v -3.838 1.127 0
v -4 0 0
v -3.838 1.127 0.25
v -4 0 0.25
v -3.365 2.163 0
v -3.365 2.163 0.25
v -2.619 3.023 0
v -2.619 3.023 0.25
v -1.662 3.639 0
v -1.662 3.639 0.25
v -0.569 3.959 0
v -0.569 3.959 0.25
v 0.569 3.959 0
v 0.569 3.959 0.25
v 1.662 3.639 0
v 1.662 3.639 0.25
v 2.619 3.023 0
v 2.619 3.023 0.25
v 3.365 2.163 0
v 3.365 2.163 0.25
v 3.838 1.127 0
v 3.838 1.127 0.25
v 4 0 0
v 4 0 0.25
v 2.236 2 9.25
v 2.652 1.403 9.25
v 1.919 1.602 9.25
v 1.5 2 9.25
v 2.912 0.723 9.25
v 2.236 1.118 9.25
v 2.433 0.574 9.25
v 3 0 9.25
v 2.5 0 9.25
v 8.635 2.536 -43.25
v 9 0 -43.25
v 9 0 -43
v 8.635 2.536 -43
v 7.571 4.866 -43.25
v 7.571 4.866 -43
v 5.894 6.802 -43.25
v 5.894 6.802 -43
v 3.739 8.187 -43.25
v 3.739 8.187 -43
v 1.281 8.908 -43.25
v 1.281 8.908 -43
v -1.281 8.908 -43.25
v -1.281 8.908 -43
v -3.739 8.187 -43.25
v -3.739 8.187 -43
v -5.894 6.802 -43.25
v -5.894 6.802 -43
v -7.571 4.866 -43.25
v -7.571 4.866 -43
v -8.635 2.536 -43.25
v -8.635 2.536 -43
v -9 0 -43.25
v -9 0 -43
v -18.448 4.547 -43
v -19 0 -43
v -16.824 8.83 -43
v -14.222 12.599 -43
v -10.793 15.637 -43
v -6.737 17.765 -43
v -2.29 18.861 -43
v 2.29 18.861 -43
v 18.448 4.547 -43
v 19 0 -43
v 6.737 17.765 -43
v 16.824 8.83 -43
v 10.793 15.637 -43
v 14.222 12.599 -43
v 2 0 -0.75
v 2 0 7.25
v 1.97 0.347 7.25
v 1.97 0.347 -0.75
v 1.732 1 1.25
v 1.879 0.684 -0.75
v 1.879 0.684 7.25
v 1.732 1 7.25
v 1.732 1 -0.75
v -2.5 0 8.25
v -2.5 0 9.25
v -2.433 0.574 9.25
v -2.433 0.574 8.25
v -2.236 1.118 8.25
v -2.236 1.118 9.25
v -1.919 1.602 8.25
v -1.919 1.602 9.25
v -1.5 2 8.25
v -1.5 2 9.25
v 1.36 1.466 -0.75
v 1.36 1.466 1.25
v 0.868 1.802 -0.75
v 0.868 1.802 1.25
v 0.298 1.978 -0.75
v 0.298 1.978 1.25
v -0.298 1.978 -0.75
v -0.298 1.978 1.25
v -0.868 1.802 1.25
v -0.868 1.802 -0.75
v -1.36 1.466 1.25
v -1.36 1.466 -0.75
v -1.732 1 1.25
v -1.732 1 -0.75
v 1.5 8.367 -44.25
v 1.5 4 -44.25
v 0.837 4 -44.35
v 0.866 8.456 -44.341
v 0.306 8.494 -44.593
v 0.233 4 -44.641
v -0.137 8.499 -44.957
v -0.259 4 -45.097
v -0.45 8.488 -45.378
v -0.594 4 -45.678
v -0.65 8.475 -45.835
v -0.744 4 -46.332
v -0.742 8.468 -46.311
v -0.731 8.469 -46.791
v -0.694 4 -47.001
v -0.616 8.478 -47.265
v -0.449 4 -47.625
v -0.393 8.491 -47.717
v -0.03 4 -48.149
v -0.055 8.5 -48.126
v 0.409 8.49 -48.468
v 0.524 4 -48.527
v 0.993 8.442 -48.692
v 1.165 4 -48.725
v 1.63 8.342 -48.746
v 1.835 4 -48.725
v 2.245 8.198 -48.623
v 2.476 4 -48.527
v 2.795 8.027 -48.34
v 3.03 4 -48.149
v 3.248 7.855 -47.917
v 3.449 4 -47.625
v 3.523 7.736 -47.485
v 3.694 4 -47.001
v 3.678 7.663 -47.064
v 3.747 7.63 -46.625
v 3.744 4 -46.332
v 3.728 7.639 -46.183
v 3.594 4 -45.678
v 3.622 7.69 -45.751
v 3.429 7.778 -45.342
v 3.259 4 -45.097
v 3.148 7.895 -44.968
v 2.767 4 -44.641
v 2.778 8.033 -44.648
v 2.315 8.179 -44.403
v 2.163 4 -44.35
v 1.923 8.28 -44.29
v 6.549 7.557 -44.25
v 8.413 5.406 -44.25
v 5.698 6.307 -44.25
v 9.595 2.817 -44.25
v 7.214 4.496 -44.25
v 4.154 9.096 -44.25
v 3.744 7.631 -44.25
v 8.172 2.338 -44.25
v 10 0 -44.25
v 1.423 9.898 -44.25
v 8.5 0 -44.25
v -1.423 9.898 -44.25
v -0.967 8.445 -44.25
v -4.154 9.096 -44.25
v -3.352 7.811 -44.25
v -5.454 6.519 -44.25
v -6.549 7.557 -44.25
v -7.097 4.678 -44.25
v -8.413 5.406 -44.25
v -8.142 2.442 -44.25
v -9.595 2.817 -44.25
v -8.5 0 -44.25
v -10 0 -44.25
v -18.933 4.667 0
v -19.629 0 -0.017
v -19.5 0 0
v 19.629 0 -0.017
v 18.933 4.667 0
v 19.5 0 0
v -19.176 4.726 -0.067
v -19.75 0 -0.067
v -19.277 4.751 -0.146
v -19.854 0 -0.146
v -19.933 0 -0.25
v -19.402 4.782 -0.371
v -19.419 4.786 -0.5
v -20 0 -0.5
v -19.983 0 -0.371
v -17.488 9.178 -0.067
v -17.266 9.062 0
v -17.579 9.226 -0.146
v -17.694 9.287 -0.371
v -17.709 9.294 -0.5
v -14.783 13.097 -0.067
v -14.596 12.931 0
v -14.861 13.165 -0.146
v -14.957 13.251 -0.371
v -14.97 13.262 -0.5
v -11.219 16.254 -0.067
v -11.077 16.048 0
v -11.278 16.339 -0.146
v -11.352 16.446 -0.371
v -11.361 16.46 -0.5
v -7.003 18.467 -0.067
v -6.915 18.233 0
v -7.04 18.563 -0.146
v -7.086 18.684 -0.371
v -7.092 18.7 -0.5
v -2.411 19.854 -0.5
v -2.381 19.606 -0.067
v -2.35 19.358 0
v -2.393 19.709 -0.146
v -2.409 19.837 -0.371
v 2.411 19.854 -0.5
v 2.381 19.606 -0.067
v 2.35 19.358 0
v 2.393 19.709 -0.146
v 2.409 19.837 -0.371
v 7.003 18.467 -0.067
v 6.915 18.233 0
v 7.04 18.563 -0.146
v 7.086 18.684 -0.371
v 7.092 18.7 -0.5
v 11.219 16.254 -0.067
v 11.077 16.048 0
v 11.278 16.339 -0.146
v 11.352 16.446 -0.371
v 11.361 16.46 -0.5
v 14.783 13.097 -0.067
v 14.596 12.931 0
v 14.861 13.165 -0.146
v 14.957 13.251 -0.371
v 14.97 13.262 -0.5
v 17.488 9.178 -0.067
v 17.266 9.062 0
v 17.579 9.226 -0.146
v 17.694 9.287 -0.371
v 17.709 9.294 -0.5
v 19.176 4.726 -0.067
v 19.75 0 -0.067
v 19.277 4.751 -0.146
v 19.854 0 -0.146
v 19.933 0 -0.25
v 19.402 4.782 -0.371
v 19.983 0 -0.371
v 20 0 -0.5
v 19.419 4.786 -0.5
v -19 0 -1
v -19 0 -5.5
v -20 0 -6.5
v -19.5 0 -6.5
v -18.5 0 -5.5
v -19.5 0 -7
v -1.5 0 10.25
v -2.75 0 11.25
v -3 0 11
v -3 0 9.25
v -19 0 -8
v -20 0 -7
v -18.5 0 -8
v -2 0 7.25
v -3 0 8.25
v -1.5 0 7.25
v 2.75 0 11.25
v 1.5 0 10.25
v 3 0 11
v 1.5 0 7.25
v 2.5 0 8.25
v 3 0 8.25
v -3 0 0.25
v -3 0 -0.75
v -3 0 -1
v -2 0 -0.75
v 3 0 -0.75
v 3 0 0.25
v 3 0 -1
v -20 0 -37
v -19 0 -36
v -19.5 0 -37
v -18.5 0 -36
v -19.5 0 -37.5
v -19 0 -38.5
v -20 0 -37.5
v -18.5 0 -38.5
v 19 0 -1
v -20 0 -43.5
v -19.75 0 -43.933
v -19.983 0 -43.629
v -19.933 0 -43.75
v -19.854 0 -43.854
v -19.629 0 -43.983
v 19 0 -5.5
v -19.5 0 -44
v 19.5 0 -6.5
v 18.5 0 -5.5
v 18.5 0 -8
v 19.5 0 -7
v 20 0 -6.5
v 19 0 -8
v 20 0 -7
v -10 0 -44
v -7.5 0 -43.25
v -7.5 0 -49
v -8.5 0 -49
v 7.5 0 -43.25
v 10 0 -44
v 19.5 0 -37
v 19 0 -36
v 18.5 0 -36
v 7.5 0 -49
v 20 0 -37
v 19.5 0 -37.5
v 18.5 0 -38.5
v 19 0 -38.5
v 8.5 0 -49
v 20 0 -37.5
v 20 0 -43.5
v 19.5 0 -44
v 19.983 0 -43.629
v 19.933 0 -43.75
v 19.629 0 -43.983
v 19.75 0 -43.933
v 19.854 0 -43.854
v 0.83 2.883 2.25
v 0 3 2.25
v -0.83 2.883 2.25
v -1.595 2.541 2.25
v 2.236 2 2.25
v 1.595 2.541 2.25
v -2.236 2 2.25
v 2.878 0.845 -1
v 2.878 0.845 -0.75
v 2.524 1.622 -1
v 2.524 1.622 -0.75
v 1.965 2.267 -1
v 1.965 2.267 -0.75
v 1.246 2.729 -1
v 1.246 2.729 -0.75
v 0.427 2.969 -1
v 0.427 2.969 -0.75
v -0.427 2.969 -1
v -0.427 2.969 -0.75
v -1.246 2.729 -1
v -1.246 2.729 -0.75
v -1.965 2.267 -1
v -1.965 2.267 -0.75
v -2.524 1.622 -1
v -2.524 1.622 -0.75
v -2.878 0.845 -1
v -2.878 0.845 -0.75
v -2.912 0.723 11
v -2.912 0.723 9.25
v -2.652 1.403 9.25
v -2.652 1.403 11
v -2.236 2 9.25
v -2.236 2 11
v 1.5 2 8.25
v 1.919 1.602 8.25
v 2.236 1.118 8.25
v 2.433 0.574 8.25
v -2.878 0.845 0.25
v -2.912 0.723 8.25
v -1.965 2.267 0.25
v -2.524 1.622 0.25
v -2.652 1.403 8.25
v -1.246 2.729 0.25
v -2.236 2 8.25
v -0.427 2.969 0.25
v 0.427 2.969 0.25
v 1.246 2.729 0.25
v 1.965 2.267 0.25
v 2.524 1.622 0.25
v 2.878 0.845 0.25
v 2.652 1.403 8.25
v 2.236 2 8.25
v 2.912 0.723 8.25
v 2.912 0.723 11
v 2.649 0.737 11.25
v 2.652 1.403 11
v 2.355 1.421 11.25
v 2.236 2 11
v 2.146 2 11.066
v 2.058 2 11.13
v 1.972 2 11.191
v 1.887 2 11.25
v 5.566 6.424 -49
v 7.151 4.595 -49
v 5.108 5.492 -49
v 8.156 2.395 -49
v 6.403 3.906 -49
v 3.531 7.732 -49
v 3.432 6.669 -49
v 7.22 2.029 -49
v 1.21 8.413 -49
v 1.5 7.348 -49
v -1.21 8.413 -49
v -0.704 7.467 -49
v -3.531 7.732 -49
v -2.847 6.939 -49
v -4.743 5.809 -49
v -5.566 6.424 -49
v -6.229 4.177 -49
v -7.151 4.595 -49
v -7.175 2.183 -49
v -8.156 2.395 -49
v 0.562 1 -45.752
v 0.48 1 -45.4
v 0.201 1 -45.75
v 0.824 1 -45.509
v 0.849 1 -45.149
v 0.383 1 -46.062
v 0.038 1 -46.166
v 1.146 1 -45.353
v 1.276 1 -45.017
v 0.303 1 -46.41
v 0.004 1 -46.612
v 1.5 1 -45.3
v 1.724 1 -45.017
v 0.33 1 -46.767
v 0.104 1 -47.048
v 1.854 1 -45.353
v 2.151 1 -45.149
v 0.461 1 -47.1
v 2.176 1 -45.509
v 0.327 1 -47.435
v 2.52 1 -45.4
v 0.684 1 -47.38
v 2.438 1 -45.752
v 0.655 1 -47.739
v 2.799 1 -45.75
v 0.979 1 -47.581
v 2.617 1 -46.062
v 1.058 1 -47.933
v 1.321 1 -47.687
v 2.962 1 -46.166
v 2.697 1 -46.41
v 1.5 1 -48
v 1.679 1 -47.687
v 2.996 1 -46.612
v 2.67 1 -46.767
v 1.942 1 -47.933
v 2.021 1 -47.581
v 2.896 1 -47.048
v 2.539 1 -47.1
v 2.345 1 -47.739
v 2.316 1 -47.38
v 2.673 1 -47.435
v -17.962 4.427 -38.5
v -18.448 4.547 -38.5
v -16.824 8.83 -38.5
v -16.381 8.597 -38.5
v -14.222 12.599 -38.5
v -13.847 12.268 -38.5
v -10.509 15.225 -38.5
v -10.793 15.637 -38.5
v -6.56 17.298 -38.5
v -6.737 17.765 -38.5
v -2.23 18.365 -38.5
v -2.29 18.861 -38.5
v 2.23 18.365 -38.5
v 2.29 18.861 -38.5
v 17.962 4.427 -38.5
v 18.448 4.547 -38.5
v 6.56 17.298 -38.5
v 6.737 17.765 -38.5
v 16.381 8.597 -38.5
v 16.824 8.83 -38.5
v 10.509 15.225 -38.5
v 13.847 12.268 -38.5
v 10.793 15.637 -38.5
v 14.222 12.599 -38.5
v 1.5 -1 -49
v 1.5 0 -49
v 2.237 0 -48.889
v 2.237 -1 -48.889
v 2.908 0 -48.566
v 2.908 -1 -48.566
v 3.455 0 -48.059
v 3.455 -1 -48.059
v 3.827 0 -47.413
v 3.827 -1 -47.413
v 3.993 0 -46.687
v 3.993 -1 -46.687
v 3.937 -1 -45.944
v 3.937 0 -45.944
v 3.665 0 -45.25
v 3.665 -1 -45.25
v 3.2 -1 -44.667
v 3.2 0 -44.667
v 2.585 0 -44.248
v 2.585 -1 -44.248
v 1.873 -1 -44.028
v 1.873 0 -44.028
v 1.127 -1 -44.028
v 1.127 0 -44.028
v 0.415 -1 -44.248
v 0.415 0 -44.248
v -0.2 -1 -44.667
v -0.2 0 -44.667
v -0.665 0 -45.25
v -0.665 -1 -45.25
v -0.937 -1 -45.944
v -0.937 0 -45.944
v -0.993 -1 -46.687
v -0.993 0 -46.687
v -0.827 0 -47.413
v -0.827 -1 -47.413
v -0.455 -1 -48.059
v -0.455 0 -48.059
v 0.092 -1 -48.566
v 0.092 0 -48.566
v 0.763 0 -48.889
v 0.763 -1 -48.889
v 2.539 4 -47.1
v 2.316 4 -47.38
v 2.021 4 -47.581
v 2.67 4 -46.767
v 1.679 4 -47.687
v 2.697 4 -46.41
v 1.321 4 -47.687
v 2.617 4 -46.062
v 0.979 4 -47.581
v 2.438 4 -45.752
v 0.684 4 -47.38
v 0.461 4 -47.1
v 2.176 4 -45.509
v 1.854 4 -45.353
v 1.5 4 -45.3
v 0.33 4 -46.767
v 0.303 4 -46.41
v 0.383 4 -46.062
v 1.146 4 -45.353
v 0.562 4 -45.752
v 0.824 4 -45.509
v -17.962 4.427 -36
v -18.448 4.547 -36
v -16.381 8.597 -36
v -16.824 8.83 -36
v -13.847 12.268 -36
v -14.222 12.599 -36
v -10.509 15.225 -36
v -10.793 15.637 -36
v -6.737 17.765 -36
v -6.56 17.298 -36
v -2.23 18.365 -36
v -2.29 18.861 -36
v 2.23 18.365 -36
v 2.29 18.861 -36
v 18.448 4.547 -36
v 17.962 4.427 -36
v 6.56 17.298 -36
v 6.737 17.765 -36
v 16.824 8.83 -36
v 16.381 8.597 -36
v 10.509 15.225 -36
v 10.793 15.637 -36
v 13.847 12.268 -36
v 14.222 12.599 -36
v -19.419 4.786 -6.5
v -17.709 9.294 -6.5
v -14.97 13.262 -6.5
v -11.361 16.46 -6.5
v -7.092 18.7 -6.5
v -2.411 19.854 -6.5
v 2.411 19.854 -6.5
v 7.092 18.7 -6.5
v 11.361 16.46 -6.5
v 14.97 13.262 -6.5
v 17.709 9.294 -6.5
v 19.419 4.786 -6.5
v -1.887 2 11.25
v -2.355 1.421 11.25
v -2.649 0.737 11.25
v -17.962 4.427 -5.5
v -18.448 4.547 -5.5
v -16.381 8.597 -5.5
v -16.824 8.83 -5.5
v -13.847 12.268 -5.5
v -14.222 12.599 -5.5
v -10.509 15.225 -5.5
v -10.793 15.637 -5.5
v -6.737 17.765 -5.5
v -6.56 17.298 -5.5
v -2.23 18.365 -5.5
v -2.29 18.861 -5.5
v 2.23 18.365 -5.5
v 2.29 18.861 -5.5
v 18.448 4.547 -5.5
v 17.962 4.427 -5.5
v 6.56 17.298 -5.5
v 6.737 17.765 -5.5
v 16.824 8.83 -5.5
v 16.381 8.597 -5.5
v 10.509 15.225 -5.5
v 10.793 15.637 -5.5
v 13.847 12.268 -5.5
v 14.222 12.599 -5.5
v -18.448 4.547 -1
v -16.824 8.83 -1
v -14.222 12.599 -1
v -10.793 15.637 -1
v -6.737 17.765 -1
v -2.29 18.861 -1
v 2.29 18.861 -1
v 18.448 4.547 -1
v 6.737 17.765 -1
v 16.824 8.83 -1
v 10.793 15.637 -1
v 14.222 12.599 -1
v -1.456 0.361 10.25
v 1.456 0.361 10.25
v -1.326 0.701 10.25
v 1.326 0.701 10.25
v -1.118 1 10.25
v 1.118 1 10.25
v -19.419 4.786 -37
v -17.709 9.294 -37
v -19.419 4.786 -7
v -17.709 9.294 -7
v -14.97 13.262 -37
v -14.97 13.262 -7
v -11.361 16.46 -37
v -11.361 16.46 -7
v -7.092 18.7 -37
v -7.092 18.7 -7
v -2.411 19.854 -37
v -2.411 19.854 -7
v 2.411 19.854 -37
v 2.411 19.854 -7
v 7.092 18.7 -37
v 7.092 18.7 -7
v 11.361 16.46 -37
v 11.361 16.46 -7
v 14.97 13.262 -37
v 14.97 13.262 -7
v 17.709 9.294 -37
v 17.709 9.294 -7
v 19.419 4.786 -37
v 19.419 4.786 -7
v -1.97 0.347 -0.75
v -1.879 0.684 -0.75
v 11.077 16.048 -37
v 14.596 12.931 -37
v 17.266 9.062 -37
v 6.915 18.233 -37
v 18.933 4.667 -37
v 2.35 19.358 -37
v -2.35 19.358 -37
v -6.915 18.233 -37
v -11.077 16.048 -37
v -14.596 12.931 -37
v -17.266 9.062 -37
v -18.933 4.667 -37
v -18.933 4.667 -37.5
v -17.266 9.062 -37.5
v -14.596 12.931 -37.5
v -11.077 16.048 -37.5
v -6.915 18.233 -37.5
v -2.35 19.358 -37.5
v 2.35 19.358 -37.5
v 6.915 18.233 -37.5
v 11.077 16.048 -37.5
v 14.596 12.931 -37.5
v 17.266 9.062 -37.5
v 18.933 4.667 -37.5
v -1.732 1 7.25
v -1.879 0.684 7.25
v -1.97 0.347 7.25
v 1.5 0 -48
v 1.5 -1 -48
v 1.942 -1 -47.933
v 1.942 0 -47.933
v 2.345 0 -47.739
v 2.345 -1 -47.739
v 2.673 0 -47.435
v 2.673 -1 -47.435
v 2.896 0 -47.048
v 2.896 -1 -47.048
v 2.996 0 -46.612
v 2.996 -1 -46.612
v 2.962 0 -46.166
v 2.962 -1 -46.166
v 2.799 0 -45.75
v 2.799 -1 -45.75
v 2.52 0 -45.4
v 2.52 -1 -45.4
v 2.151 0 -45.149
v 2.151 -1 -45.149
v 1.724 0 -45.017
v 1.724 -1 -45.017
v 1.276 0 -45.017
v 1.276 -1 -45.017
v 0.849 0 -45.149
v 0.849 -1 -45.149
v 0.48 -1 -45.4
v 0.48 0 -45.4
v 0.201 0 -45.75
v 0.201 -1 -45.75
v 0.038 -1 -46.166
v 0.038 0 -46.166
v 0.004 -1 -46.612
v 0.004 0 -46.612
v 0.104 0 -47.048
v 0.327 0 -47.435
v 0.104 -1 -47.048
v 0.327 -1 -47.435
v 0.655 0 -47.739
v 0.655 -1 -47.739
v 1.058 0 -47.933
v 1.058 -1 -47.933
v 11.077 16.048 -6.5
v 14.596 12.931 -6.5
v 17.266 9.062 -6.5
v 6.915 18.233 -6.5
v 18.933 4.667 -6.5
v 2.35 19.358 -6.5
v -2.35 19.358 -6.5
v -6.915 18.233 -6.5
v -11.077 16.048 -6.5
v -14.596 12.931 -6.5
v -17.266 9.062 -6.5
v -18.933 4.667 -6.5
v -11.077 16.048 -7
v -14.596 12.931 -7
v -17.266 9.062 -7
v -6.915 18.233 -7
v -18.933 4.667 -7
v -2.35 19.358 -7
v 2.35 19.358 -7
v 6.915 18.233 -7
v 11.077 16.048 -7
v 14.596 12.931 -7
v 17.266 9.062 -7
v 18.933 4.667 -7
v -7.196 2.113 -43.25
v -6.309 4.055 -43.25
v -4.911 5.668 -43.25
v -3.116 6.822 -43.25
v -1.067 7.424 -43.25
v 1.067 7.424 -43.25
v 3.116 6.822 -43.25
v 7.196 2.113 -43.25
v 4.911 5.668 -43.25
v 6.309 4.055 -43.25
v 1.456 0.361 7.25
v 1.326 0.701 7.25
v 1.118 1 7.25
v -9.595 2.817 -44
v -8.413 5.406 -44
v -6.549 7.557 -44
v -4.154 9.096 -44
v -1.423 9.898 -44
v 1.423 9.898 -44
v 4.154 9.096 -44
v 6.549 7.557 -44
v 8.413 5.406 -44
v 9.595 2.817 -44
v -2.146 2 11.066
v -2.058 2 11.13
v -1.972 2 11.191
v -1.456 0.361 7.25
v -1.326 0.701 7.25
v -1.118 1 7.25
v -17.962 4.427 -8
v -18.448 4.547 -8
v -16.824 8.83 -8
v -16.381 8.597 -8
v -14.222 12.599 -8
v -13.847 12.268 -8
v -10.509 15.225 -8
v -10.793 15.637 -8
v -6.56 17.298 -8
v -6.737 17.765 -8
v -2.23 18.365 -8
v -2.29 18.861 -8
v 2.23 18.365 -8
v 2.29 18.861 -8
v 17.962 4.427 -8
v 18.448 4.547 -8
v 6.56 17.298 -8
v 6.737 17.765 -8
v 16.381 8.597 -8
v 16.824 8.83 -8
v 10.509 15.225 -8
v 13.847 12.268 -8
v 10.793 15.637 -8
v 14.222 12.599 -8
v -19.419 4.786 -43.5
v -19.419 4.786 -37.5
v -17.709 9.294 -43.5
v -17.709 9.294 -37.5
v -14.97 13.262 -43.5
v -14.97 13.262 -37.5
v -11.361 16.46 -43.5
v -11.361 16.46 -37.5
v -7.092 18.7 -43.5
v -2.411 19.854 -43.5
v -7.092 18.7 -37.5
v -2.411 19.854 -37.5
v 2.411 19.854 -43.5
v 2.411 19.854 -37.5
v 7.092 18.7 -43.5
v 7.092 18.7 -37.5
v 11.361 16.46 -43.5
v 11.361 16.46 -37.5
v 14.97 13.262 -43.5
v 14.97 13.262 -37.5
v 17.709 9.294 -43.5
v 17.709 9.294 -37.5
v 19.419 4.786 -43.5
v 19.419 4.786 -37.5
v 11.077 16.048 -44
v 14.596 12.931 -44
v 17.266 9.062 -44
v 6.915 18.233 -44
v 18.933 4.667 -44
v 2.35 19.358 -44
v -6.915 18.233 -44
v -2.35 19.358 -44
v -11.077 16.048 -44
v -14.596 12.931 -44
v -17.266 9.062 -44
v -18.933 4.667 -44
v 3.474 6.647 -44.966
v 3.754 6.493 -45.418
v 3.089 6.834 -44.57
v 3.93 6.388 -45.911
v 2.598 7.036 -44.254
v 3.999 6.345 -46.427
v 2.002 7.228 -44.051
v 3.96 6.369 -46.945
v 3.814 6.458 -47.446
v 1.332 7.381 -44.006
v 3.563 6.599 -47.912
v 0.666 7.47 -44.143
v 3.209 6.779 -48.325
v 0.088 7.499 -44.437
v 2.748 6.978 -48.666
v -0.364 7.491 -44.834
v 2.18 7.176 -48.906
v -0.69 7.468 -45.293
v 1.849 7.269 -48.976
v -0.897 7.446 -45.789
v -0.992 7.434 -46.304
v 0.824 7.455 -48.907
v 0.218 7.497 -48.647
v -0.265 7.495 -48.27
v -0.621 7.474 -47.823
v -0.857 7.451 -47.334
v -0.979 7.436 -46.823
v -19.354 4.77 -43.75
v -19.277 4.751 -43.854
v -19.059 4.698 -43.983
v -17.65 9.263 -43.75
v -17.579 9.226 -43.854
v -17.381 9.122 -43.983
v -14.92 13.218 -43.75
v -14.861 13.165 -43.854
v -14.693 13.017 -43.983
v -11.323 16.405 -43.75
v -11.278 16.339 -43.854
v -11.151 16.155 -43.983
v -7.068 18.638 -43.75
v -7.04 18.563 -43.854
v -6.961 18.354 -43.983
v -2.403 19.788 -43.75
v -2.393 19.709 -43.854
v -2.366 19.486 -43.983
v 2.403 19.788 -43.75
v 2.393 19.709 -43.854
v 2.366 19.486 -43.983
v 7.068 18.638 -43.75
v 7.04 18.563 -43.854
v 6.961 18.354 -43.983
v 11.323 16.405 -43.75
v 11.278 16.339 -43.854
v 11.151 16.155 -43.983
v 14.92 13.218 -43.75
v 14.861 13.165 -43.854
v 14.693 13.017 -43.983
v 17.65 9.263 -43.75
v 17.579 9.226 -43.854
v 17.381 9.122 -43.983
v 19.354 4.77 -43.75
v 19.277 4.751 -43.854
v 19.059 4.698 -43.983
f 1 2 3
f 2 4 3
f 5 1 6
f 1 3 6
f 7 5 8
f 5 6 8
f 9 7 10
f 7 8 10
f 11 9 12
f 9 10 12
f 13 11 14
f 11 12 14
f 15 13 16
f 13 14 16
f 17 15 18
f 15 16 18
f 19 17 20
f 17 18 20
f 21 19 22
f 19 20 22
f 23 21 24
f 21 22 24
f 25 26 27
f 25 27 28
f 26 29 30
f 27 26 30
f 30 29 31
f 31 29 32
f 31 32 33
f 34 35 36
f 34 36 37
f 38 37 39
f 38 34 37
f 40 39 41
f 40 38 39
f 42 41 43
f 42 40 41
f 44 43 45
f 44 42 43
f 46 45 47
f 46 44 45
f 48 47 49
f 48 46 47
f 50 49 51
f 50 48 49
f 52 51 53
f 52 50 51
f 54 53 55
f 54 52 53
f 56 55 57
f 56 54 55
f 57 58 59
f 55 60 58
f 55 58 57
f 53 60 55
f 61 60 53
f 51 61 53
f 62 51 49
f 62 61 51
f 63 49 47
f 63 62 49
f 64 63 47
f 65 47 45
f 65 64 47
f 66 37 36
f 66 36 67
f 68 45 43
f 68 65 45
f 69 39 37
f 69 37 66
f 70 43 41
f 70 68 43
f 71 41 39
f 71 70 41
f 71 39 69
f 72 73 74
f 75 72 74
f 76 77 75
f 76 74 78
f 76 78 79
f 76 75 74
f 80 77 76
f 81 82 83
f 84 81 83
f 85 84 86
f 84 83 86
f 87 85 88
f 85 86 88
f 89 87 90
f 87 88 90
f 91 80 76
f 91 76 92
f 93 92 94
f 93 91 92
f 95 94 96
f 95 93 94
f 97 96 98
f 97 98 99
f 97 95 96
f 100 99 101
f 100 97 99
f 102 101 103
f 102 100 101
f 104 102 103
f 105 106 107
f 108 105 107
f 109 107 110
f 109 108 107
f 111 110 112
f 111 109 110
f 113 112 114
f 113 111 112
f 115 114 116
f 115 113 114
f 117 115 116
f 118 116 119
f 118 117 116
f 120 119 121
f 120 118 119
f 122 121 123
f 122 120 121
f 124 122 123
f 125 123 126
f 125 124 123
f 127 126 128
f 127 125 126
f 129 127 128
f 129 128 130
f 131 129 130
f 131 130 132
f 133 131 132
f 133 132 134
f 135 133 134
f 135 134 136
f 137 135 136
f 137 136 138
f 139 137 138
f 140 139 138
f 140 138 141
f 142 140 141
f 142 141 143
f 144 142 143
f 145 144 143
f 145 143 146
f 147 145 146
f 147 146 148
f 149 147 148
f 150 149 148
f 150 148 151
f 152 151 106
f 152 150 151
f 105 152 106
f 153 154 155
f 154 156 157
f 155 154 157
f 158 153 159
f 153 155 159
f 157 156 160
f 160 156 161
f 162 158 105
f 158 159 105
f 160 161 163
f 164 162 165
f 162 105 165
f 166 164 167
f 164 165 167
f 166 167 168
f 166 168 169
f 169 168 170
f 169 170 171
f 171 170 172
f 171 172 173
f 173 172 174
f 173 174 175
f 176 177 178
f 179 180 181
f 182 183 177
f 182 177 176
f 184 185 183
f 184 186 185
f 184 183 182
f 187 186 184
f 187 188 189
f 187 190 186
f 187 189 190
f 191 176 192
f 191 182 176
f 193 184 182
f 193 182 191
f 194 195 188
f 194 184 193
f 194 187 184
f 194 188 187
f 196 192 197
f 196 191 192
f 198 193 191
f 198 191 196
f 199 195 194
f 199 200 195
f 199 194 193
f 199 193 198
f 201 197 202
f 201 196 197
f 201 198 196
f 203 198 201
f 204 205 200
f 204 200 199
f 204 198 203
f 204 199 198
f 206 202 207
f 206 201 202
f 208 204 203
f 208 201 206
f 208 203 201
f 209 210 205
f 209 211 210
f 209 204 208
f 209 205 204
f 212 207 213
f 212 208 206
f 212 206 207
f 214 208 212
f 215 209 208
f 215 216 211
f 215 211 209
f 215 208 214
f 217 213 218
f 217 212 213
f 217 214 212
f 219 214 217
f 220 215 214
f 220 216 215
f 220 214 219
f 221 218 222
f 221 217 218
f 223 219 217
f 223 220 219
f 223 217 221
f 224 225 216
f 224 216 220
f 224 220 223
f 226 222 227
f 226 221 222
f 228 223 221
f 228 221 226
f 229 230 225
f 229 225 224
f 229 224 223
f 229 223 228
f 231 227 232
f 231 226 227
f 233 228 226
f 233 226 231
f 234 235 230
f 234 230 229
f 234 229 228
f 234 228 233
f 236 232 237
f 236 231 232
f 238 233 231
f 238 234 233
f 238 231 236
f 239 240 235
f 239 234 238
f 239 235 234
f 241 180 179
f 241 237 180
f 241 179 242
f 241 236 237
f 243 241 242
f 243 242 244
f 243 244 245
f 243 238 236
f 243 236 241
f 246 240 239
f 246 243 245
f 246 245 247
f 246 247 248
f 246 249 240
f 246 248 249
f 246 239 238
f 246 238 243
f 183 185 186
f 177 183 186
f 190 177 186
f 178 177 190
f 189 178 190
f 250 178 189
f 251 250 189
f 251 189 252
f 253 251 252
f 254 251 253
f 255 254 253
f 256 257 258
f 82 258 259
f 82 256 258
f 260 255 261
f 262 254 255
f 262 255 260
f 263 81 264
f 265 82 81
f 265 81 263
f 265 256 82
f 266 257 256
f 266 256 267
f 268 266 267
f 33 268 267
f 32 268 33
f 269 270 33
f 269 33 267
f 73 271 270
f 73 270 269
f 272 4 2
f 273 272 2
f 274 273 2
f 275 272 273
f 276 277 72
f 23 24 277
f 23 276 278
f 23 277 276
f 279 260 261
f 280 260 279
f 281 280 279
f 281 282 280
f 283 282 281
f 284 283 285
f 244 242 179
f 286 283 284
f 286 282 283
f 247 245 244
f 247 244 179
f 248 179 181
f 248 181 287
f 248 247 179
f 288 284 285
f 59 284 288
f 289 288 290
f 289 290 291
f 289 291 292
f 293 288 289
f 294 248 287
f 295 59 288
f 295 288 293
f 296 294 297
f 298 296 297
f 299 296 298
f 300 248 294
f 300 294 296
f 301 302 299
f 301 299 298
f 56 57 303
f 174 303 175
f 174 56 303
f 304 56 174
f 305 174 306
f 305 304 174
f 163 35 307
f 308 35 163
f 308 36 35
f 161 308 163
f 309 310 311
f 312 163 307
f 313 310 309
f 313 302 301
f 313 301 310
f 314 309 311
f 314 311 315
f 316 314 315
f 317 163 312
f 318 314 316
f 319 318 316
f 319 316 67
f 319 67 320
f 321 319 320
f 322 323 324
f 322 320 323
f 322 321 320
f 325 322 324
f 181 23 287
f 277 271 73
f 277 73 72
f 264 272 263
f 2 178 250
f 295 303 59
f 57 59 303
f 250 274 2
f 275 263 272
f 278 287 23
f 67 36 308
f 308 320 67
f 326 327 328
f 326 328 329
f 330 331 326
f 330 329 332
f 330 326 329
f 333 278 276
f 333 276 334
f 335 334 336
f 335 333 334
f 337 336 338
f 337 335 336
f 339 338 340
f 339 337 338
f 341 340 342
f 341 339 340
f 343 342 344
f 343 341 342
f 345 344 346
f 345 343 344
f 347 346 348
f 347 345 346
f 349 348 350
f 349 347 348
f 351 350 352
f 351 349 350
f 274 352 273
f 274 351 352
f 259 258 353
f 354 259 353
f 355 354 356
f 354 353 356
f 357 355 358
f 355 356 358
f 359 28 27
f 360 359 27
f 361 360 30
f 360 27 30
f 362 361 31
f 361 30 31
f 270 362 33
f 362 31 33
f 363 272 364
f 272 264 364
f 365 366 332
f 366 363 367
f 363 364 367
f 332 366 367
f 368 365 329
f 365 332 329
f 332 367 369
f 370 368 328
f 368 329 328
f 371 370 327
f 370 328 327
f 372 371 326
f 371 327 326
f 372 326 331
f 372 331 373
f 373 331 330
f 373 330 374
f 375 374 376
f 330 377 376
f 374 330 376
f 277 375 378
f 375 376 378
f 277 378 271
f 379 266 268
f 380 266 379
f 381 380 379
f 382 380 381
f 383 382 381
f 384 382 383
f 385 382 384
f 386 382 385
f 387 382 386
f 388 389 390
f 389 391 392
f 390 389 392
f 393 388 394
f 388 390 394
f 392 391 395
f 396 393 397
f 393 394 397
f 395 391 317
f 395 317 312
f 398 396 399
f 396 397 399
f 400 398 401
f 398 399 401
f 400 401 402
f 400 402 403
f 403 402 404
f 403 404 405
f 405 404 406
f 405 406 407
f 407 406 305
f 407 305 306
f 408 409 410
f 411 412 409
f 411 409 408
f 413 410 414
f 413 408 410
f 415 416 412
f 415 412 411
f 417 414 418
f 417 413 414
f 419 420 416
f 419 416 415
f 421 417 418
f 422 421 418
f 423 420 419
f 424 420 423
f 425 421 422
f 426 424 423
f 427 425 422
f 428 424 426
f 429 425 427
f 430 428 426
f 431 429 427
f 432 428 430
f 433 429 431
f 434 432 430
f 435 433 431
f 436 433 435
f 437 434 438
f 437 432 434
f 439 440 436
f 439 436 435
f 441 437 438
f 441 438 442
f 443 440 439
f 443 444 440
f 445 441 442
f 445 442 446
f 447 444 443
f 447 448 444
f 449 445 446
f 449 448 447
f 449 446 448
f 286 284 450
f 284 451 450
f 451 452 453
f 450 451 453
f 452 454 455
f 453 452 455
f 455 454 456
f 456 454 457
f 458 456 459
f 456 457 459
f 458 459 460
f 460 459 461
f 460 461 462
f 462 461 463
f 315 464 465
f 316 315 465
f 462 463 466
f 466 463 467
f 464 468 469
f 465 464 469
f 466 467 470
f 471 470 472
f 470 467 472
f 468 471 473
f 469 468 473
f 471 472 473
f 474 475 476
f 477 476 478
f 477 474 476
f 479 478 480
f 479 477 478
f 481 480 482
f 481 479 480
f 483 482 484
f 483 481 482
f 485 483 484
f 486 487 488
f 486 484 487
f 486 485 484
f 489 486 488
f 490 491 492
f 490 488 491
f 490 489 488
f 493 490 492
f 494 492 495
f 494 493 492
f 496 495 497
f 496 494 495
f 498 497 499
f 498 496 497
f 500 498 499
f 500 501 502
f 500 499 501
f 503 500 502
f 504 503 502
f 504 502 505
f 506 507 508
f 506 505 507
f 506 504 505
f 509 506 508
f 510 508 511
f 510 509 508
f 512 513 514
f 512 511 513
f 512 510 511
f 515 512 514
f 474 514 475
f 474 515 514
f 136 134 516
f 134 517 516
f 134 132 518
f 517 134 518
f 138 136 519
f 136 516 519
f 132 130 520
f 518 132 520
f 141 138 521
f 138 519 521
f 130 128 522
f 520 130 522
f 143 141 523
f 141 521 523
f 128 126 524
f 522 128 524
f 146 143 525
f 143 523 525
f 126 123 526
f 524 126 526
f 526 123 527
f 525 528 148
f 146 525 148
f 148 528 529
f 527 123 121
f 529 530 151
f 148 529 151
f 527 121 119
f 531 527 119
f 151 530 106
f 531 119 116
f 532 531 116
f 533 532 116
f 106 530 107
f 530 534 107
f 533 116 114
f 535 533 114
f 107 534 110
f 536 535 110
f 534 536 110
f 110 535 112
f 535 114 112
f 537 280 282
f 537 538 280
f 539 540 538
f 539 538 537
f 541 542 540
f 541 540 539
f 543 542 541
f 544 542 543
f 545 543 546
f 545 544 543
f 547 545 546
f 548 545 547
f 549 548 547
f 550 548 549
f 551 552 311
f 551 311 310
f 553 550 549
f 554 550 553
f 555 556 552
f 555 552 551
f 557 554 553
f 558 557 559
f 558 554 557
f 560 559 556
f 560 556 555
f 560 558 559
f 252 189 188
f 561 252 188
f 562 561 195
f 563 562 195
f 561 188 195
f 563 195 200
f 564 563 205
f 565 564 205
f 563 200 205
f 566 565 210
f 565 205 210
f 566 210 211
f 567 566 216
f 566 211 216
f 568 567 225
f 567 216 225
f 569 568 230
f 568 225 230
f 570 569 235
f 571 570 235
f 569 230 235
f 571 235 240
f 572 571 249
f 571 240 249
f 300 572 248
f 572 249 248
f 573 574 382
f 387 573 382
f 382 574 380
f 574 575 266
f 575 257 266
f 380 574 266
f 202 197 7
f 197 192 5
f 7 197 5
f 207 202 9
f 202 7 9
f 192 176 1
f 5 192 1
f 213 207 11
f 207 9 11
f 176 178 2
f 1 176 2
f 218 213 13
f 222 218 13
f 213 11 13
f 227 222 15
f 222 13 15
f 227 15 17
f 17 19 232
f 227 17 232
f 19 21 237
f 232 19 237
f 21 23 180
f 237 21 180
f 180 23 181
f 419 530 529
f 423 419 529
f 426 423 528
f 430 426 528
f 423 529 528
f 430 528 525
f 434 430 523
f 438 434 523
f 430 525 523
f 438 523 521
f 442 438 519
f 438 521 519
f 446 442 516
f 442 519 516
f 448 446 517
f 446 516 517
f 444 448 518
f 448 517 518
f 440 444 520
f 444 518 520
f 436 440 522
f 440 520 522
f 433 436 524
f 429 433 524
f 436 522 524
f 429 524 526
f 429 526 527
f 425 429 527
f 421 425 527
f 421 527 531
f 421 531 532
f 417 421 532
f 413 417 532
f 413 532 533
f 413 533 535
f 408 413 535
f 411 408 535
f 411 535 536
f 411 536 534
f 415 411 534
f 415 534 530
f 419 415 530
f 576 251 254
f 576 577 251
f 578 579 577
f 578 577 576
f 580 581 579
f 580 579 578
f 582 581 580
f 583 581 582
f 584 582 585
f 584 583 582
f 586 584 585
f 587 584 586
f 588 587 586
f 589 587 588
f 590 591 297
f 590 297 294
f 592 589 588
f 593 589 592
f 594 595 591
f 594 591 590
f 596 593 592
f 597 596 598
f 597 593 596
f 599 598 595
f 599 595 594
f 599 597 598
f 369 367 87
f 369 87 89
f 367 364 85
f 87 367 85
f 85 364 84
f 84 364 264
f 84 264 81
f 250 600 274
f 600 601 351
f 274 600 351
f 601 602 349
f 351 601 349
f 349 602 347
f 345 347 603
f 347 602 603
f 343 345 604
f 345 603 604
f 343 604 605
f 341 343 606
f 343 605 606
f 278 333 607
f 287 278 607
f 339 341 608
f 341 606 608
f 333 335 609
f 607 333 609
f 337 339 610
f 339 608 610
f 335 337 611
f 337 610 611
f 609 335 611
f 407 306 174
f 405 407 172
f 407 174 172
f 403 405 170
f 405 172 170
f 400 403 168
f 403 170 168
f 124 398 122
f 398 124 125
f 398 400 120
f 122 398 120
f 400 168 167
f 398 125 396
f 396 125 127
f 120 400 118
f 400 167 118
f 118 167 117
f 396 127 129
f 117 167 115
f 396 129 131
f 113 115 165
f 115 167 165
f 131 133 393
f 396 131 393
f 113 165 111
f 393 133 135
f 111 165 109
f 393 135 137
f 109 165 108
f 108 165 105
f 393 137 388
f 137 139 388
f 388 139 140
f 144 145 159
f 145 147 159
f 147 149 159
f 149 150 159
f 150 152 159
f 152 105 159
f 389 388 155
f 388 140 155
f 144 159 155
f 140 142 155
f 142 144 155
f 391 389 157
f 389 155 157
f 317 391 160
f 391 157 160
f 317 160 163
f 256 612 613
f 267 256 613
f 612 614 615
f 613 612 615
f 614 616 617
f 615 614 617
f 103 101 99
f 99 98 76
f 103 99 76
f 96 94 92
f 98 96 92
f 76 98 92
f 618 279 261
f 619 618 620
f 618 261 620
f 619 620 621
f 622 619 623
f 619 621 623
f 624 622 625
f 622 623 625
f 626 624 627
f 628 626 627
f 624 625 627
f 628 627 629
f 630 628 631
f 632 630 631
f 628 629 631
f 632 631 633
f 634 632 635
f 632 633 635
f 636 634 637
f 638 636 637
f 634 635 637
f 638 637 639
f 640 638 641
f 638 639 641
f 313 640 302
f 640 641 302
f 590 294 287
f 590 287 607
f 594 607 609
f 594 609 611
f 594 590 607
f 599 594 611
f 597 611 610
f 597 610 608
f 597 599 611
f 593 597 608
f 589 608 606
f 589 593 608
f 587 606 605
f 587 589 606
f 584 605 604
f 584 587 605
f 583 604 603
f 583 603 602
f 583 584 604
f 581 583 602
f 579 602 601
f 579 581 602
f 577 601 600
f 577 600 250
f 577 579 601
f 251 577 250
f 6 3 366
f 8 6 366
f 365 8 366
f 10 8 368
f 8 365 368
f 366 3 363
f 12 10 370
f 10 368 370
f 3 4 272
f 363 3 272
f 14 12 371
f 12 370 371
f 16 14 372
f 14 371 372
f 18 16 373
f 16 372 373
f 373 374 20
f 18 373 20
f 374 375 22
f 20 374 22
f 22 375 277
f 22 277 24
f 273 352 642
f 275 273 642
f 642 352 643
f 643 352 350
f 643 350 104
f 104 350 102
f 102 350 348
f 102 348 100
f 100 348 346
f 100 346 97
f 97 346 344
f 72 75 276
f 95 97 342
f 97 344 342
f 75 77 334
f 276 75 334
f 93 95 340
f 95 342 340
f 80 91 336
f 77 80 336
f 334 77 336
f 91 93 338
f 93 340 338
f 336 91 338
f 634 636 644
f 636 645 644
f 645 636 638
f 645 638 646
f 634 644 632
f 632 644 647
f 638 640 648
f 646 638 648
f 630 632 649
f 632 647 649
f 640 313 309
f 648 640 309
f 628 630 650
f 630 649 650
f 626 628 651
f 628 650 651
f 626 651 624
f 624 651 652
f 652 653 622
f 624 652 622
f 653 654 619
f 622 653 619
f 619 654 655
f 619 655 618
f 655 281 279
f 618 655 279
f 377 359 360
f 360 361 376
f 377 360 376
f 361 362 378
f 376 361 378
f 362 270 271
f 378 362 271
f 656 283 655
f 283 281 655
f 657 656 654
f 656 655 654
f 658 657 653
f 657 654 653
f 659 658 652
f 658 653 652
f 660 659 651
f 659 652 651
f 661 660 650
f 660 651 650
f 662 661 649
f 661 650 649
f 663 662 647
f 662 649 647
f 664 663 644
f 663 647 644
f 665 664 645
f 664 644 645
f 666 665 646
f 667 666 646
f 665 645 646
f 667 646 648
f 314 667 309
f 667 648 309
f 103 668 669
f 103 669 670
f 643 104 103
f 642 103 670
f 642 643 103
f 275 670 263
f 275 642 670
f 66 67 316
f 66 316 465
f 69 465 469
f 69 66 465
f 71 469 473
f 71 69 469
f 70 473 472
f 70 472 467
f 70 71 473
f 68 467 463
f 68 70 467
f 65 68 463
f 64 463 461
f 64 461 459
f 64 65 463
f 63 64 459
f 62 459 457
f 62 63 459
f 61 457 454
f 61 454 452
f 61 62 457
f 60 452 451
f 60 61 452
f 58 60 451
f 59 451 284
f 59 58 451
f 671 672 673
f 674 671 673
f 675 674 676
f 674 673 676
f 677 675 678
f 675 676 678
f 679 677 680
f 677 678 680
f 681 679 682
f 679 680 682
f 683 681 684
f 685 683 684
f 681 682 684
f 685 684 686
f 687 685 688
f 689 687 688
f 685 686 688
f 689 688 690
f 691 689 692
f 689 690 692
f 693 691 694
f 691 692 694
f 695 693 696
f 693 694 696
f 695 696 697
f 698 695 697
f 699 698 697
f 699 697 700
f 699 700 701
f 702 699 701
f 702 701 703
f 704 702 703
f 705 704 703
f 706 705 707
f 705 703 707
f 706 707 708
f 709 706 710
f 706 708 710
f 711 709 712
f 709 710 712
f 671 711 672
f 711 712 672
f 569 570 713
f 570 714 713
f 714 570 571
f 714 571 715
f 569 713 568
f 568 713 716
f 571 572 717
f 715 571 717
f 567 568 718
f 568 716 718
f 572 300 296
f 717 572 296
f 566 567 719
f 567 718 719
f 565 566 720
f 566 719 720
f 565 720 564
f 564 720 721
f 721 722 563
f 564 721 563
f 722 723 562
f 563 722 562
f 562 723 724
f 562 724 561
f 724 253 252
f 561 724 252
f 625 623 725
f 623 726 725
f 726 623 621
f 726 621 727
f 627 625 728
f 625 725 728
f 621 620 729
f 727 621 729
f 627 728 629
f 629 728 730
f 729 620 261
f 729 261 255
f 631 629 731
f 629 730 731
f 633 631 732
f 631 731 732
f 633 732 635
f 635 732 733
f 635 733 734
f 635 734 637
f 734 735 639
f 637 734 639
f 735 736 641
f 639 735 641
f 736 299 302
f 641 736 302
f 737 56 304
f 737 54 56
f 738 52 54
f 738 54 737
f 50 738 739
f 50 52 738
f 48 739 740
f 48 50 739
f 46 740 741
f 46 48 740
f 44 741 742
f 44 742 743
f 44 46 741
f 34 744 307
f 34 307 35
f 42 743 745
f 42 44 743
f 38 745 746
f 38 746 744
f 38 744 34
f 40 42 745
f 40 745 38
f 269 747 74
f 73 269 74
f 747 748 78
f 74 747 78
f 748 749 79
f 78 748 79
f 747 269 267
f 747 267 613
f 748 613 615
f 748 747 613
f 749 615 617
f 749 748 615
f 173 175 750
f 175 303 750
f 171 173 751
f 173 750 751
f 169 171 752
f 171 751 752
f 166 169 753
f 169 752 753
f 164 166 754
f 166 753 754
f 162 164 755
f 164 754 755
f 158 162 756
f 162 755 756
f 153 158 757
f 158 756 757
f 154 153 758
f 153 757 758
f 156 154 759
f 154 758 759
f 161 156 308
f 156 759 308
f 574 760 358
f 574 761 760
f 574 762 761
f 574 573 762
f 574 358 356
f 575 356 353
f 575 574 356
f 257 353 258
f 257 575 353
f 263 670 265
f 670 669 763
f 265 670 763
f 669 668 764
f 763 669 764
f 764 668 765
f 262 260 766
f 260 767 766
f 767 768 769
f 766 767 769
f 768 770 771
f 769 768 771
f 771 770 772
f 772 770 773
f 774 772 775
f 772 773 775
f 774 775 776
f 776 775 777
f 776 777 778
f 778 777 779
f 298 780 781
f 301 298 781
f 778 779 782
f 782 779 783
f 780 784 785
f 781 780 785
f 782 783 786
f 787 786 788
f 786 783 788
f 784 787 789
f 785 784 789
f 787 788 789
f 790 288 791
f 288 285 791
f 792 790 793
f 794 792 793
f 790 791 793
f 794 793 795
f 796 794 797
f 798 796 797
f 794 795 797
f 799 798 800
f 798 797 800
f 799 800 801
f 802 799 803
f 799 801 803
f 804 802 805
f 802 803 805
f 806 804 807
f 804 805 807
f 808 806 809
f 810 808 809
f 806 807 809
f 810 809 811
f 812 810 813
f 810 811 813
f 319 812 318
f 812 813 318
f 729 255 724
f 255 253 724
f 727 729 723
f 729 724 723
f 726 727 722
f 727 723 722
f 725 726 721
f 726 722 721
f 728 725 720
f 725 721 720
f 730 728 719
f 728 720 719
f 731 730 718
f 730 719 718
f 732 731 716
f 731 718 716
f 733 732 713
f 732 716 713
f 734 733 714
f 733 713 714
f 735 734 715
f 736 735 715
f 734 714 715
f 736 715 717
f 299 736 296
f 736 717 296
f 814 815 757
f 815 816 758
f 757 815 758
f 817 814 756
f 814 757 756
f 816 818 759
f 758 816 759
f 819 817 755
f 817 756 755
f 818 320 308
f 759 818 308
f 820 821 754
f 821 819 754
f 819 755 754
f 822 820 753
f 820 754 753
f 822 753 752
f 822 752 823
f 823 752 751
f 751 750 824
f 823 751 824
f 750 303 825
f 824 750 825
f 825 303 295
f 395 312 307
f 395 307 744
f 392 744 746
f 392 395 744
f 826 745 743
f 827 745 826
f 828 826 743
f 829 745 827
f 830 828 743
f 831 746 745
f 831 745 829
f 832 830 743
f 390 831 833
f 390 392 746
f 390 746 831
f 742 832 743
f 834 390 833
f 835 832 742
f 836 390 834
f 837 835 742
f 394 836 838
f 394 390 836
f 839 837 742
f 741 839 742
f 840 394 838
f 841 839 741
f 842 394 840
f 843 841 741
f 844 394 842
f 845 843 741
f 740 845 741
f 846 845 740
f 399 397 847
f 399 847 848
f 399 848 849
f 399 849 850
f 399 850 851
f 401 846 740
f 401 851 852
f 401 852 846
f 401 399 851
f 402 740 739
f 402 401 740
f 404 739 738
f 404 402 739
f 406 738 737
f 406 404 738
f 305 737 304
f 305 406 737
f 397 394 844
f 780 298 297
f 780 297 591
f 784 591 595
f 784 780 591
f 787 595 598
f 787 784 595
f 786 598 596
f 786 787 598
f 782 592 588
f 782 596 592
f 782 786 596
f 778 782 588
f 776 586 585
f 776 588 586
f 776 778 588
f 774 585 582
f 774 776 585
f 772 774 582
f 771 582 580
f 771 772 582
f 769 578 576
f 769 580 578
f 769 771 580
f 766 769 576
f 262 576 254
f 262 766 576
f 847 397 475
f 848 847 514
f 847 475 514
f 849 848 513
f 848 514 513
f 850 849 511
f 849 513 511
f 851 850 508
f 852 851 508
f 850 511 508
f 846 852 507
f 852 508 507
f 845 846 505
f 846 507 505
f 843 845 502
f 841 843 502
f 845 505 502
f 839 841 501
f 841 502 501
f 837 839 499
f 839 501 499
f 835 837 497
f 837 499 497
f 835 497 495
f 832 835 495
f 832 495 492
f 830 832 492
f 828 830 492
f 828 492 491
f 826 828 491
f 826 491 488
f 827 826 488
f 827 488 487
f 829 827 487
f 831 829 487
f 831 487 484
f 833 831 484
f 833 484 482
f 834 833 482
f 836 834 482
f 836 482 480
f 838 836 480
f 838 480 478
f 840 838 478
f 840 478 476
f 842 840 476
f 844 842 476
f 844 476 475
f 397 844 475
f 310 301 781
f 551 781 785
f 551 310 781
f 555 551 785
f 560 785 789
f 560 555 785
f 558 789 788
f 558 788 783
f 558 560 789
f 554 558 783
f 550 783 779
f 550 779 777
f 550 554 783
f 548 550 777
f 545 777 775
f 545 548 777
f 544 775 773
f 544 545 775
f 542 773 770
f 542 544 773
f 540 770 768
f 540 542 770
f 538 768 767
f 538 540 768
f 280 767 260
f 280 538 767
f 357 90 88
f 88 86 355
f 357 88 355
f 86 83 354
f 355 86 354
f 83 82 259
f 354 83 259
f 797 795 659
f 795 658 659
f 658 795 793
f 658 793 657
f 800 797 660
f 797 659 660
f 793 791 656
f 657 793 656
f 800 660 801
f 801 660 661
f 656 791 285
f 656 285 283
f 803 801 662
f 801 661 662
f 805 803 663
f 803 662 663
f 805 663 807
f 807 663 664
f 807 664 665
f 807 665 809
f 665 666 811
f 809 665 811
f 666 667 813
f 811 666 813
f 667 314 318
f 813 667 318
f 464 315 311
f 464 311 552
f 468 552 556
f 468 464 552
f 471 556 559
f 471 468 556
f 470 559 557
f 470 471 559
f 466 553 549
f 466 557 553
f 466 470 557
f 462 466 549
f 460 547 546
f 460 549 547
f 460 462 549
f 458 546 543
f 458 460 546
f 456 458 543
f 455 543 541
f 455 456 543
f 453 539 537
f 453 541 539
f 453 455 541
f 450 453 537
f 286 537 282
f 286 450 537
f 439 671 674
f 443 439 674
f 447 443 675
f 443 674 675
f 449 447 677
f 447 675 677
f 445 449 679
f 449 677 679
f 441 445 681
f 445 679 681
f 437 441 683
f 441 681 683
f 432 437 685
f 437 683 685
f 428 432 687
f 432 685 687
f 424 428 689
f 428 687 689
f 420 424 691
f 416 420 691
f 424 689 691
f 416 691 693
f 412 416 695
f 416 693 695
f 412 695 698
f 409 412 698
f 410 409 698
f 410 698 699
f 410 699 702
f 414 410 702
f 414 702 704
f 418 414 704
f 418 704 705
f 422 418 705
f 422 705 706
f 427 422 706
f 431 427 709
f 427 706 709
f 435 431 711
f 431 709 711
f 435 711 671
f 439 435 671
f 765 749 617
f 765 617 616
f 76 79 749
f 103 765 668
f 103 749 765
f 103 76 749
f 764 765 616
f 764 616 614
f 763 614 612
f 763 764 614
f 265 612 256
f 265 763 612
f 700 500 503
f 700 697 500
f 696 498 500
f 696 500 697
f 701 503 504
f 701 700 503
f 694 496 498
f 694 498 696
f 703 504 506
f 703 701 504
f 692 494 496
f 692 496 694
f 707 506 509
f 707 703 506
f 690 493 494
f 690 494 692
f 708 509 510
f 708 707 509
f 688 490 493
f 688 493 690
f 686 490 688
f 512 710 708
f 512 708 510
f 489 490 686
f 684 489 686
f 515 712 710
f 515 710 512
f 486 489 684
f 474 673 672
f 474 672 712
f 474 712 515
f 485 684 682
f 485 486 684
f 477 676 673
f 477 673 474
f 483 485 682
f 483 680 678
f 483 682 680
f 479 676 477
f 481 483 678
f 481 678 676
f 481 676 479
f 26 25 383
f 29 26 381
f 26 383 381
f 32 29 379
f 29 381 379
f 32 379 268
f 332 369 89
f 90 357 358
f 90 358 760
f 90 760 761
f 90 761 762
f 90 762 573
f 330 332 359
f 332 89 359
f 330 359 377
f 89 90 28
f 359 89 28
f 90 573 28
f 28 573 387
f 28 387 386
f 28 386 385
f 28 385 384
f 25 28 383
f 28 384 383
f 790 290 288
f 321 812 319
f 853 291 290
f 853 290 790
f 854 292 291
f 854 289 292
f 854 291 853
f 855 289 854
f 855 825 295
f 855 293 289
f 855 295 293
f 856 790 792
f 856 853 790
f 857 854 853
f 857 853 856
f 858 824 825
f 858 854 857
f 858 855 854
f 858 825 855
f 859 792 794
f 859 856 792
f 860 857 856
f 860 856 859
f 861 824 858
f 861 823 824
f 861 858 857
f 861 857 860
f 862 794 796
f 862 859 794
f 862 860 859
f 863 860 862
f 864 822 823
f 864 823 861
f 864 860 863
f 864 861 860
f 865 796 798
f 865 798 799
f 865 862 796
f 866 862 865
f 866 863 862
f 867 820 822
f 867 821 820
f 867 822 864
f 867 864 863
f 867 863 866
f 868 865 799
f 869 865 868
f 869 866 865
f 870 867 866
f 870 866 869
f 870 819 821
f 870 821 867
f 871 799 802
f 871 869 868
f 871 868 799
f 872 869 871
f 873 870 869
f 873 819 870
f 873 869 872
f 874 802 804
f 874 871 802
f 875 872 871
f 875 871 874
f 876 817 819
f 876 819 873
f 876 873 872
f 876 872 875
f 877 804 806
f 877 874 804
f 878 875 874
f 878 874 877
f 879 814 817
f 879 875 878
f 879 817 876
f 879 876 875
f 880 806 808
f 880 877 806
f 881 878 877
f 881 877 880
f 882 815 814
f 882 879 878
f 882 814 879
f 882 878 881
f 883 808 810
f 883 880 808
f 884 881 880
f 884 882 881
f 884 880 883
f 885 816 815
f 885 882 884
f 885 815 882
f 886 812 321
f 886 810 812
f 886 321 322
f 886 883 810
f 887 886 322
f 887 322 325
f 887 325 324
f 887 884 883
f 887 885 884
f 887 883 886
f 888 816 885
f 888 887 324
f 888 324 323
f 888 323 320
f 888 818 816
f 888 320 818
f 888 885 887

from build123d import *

# Parameters (mm, degrees)
ENL_V_MAT_EXTRU_2_DEPTH = 9
CHANFREIN1_SIZE         = 0.25
CONG_1_R                = 0.5
ESQUISSE4_R             = 10
ENL_V_MAT_EXTRU_3_DEPTH = 23
CONG_2_R                = 1
ESQUISSE5_W             = 75.40554743
ESQUISSE5_H             = 27.453522384
ENL_V_MAT_EXTRU_4_DEPTH = 30
COQUE1_START            = -43
COQUE1_DEPTH            = 42
COQUE1_START_2          = -36
COQUE1_2_DEPTH          = 28
COQUE1_START_3          = -48
COQUE1_3_DEPTH          = 5
COQUE1_4_DEPTH          = 4.5
COQUE1_START_4          = -5.5
COQUE1_5_DEPTH          = 4.5
COQUE1_START_5          = -1
COQUE1_6_DEPTH          = 8.25
COQUE1_START_6          = -43.25
COQUE1_7_DEPTH          = 0.25
COQUE1_START_7          = 7.25
COQUE1_8_DEPTH          = 3
COQUE1_9_DEPTH          = 2.25
COQUE1_10_DEPTH         = 0.25
ENL_V_START             = -10
ENL_V_MAT_EXTRU_5_DEPTH = 10
BOSS_EXTRU_1_REACH      = 58.577
BOSS_EXTRU_1_END_RADIUS = 7.5
ESQUISSE7_R             = 2.5
ESQUISSE9_R             = 2.25
ENL_V_MAT_EXTRU_6_DEPTH = 7
D_GAGEMENT_M22_D        = 2.4
BOSS_EXTRU_2_START      = 1
ESQUISSE11_R            = 2.5
ESQUISSE11_R_2          = 1.5
BOSS_EXTRU_2_DEPTH      = 1
ESQUISSE12_R            = 1.5
ESQUISSE12_R_2          = 1.2
ENL_V_MAT_EXTRU_7_DEPTH = 1


# Read off the part's stored shape, not the designer's step: Coque1
with BuildPart() as part:
    # Esquisse1 → Révolution1 (revolve)
    with BuildSketch(Plane(origin=(0, 0, 0), x_dir=(1, 0, 0), z_dir=(0, 1, 0))):
        Polygon((20, 0), (4, 0), (4, -0.25), (3, -0.25), (3, -8.25), (2.5, -8.25), (2.5, -9.25), (3, -9.25), (3, -11.25), (0, -11.25), (0, 49), (8.5, 49), (8.5, 44.25), (10, 44.25), (10, 44), (20, 44), (20, 37.5), (19.5, 37.5), (19.5, 37), (20, 37), (20, 7), (19.5, 7), (19.5, 6.5), (20, 6.5), align=None)
    revolve(axis=Axis((0, 0, 0), (0, 0, -1)))

    # Esquisse3 → Enlèv. mat.-Extru.2 (cut)
    with BuildSketch(Plane.XY.offset(11.25)):
        with BuildLine():
            Line((-2.236067977, 2), (2.236067977, 2))
            ThreePointArc((2.236067977, 2), (0, 3), (-2.236067977, 2))
        make_face()
    extrude(amount=-ENL_V_MAT_EXTRU_2_DEPTH, mode=Mode.SUBTRACT)

    # Chanfrein1
    chanfrein1_edges = [part.edges().sort_by_distance(p)[0] for p in [
        (0, -3, 11.25),
    ]]
    chamfer(chanfrein1_edges, length=CHANFREIN1_SIZE)

    # Congé1
    cong_1_edges = [part.edges().sort_by_distance(p)[0] for p in [
        (-20, 0, 0),
        (-20, 0, -44),
    ]]
    fillet(cong_1_edges, radius=CONG_1_R)

    # Esquisse4 → Enlèv. mat.-Extru.3 (cut)
    with BuildSketch(Plane(origin=(0, -29, 0), x_dir=(-1, 0, 0), z_dir=(0, 1, 0))):
        with Locations(Location((0, -22, 0), (0, 0, 270))):
            Circle(ESQUISSE4_R)
    extrude(amount=ENL_V_MAT_EXTRU_3_DEPTH, mode=Mode.SUBTRACT)

    # Congé2
    cong_2_edges = [part.edges().sort_by_distance(p)[0] for p in [
        (-0.062948247, -19.999900935, -12.000198118),
    ]]
    fillet(cong_2_edges, radius=CONG_2_R - 0.0001)  # a hair under: the kernel refuses the full size

    # Esquisse5 → Enlèv. mat.-Extru.4 (cut, symmetric)
    with BuildSketch(Plane(origin=(0, 0, 0), x_dir=(0, 0, -1), z_dir=(1, 0, 0))):
        with Locations((20.552947191, -13.726761192)):
            Rectangle(ESQUISSE5_W, ESQUISSE5_H)
    extrude(amount=ENL_V_MAT_EXTRU_4_DEPTH, both=True, mode=Mode.SUBTRACT)

    # Coque1 outline → Coque1 (cut)
    with BuildSketch(Plane.XY.offset(COQUE1_START)):
        with BuildLine():
            ThreePointArc((18.5, 0), (0, 18.5), (-18.5, 0))
            Line((-18.5, 0), (18.5, 0))
        make_face()
    extrude(amount=COQUE1_DEPTH, mode=Mode.SUBTRACT)

    # Coque1 2 outline → Coque1 2 (cut)
    with BuildSketch(Plane.XY.offset(COQUE1_START_2)):
        with BuildLine():
            Line((-19, 0), (-18.5, 0))
            ThreePointArc((-18.5, 0), (0, 18.5), (18.5, 0))
            Line((18.5, 0), (19, 0))
            ThreePointArc((19, 0), (0, 19), (-19, 0))
        make_face()
    extrude(amount=COQUE1_2_DEPTH, mode=Mode.SUBTRACT)

    # Coque1 3 outline → Coque1 3 (cut)
    with BuildSketch(Plane.XY.offset(COQUE1_START_3)):
        with BuildLine():
            ThreePointArc((7.5, 0), (0, 7.5), (-7.5, 0))
            Line((-7.5, 0), (7.5, 0))
        make_face()
    extrude(amount=COQUE1_3_DEPTH, mode=Mode.SUBTRACT)

    # Coque1 4 outline → Coque1 4 (cut)
    with BuildSketch(Plane.XY.offset(COQUE1_START)):
        with BuildLine():
            Line((-19, 0), (-18.5, 0))
            ThreePointArc((-18.5, 0), (0, 18.5), (18.5, 0))
            Line((18.5, 0), (19, 0))
            ThreePointArc((19, 0), (0, 19), (-19, 0))
        make_face()
    extrude(amount=COQUE1_4_DEPTH, mode=Mode.SUBTRACT)

    # Coque1 5 outline → Coque1 5 (cut)
    with BuildSketch(Plane.XY.offset(COQUE1_START_4)):
        with BuildLine():
            Line((-19, 0), (-18.5, 0))
            ThreePointArc((-18.5, 0), (0, 18.5), (18.5, 0))
            Line((18.5, 0), (19, 0))
            ThreePointArc((19, 0), (0, 19), (-19, 0))
        make_face()
    extrude(amount=COQUE1_5_DEPTH, mode=Mode.SUBTRACT)

    # Coque1 6 outline → Coque1 6 (cut)
    with BuildSketch(Plane.XY.offset(COQUE1_START_5)):
        with BuildLine():
            ThreePointArc((-1.732050808, 1), (-1.931851653, 0.51763809), (-2, 0))
            Line((-2, 0), (2, 0))
            ThreePointArc((2, 0), (1.931851653, 0.51763809), (1.732050808, 1))
            Line((1.732050808, 1), (-1.732050808, 1))
        make_face()
    extrude(amount=COQUE1_6_DEPTH, mode=Mode.SUBTRACT)

    # Coque1 7 outline → Coque1 7 (cut)
    with BuildSketch(Plane.XY.offset(COQUE1_START_6)):
        with BuildLine():
            Line((-9, 0), (-7.5, 0))
            ThreePointArc((-7.5, 0), (0, 7.5), (7.5, 0))
            Line((7.5, 0), (9, 0))
            ThreePointArc((9, 0), (0, 9), (-9, 0))
        make_face()
    extrude(amount=COQUE1_7_DEPTH, mode=Mode.SUBTRACT)

    # Coque1 8 outline → Coque1 8 (cut)
    with BuildSketch(Plane.XY.offset(COQUE1_START_7)):
        with BuildLine():
            Line((1.118033989, 1), (-1.118033989, 1))
            ThreePointArc((-1.118033989, 1), (-1.401258538, 0.535233134), (-1.5, 0))
            Line((-1.5, 0), (1.5, 0))
            ThreePointArc((1.5, 0), (1.401258538, 0.535233134), (1.118033989, 1))
        make_face()
    extrude(amount=COQUE1_8_DEPTH, mode=Mode.SUBTRACT)

    # Coque1 9 outline → Coque1 9 (cut)
    with BuildSketch(Plane.XY.offset(COQUE1_START_5)):
        with BuildLine():
            Line((-1.732050808, 1), (1.732050808, 1))
            ThreePointArc((1.732050808, 1), (0, 2), (-1.732050808, 1))
        make_face()
    extrude(amount=COQUE1_9_DEPTH, mode=Mode.SUBTRACT)

    # Coque1 10 outline → Coque1 10 (cut)
    with BuildSketch(Plane.XY.offset(COQUE1_START_5)):
        with BuildLine():
            ThreePointArc((-2, 0), (0, 2), (2, 0))
            Line((2, 0), (3, 0))
            ThreePointArc((3, 0), (0, 3), (-3, 0))
            Line((-3, 0), (-2, 0))
        make_face()
    extrude(amount=COQUE1_10_DEPTH, mode=Mode.SUBTRACT)

    # Esquisse6 → Enlèv. mat.-Extru.5 (cut)
    with BuildSketch(Plane.XY.offset(-48).offset(ENL_V_START)):
        with BuildLine():
            Line((-7.5, 0), (7.5, 0))
            ThreePointArc((7.5, 0), (0, 7.5), (-7.5, 0))
        make_face()
    extrude(amount=ENL_V_MAT_EXTRU_5_DEPTH, mode=Mode.SUBTRACT)

    # Boss.-Extru.1: up to this cylinder (the profile starts inside it)
    boss_extru_1_end = Plane(origin=(0, 0, -46.5), z_dir=(0, 0, 1)) * Cylinder(BOSS_EXTRU_1_END_RADIUS, 133.154, mode=Mode.PRIVATE)
    # Esquisse7 → Boss.-Extru.1 (add, up to the surface)
    with BuildSketch(Plane(origin=(0, 0, 0), x_dir=(1, 0, 0), z_dir=(0, 1, 0)), mode=Mode.PRIVATE) as boss_extru_1_sk1:
        with Locations(Location((1.5, 46.5, 0), (0, 0, 90))):
            Circle(ESQUISSE7_R)
    boss_extru_1_tool1 = extrude(boss_extru_1_sk1.sketch, amount=BOSS_EXTRU_1_REACH, mode=Mode.PRIVATE) & boss_extru_1_end
    add(boss_extru_1_tool1.solids().sort_by_distance((1.5, 0, -46.5))[0])

    # Esquisse9 → Enlèv. mat.-Extru.6 (cut)
    with BuildSketch(Plane.XZ.offset(-11)):
        with Locations(Location((1.5, -46.5, 0), (0, 0, 90))):
            Circle(ESQUISSE9_R)
    extrude(amount=ENL_V_MAT_EXTRU_6_DEPTH, mode=Mode.SUBTRACT)

    # Dégagement M22 (through all)
    with Locations(Plane(origin=(1.5, 0, -46.5), x_dir=(0, 0, -1), z_dir=(0, -1, 0))):
        with Locations((0, 0)):
            Hole(D_GAGEMENT_M22_D / 2)

    # Esquisse11 → Boss.-Extru.2 (add)
    with BuildSketch(Plane.XZ.offset(BOSS_EXTRU_2_START)):
        with Locations(Location((1.5, -46.5, 0), (0, 0, 270))):
            Circle(ESQUISSE11_R)
        with Locations(Location((1.5, -46.5, 0), (0, 0, 270))):
            Circle(ESQUISSE11_R_2, mode=Mode.SUBTRACT)
    extrude(amount=-BOSS_EXTRU_2_DEPTH)

    # Esquisse12 → Enlèv. mat.-Extru.7 (cut)
    with BuildSketch(Plane.XZ):
        with Locations(Location((1.5, -46.5, 0), (0, 0, 270))):
            Circle(ESQUISSE12_R)
        with Locations(Location((1.5, -46.5, 0), (0, 0, 270))):
            Circle(ESQUISSE12_R_2, mode=Mode.SUBTRACT)
    extrude(amount=-ENL_V_MAT_EXTRU_7_DEPTH, mode=Mode.SUBTRACT)


solid = part.part
